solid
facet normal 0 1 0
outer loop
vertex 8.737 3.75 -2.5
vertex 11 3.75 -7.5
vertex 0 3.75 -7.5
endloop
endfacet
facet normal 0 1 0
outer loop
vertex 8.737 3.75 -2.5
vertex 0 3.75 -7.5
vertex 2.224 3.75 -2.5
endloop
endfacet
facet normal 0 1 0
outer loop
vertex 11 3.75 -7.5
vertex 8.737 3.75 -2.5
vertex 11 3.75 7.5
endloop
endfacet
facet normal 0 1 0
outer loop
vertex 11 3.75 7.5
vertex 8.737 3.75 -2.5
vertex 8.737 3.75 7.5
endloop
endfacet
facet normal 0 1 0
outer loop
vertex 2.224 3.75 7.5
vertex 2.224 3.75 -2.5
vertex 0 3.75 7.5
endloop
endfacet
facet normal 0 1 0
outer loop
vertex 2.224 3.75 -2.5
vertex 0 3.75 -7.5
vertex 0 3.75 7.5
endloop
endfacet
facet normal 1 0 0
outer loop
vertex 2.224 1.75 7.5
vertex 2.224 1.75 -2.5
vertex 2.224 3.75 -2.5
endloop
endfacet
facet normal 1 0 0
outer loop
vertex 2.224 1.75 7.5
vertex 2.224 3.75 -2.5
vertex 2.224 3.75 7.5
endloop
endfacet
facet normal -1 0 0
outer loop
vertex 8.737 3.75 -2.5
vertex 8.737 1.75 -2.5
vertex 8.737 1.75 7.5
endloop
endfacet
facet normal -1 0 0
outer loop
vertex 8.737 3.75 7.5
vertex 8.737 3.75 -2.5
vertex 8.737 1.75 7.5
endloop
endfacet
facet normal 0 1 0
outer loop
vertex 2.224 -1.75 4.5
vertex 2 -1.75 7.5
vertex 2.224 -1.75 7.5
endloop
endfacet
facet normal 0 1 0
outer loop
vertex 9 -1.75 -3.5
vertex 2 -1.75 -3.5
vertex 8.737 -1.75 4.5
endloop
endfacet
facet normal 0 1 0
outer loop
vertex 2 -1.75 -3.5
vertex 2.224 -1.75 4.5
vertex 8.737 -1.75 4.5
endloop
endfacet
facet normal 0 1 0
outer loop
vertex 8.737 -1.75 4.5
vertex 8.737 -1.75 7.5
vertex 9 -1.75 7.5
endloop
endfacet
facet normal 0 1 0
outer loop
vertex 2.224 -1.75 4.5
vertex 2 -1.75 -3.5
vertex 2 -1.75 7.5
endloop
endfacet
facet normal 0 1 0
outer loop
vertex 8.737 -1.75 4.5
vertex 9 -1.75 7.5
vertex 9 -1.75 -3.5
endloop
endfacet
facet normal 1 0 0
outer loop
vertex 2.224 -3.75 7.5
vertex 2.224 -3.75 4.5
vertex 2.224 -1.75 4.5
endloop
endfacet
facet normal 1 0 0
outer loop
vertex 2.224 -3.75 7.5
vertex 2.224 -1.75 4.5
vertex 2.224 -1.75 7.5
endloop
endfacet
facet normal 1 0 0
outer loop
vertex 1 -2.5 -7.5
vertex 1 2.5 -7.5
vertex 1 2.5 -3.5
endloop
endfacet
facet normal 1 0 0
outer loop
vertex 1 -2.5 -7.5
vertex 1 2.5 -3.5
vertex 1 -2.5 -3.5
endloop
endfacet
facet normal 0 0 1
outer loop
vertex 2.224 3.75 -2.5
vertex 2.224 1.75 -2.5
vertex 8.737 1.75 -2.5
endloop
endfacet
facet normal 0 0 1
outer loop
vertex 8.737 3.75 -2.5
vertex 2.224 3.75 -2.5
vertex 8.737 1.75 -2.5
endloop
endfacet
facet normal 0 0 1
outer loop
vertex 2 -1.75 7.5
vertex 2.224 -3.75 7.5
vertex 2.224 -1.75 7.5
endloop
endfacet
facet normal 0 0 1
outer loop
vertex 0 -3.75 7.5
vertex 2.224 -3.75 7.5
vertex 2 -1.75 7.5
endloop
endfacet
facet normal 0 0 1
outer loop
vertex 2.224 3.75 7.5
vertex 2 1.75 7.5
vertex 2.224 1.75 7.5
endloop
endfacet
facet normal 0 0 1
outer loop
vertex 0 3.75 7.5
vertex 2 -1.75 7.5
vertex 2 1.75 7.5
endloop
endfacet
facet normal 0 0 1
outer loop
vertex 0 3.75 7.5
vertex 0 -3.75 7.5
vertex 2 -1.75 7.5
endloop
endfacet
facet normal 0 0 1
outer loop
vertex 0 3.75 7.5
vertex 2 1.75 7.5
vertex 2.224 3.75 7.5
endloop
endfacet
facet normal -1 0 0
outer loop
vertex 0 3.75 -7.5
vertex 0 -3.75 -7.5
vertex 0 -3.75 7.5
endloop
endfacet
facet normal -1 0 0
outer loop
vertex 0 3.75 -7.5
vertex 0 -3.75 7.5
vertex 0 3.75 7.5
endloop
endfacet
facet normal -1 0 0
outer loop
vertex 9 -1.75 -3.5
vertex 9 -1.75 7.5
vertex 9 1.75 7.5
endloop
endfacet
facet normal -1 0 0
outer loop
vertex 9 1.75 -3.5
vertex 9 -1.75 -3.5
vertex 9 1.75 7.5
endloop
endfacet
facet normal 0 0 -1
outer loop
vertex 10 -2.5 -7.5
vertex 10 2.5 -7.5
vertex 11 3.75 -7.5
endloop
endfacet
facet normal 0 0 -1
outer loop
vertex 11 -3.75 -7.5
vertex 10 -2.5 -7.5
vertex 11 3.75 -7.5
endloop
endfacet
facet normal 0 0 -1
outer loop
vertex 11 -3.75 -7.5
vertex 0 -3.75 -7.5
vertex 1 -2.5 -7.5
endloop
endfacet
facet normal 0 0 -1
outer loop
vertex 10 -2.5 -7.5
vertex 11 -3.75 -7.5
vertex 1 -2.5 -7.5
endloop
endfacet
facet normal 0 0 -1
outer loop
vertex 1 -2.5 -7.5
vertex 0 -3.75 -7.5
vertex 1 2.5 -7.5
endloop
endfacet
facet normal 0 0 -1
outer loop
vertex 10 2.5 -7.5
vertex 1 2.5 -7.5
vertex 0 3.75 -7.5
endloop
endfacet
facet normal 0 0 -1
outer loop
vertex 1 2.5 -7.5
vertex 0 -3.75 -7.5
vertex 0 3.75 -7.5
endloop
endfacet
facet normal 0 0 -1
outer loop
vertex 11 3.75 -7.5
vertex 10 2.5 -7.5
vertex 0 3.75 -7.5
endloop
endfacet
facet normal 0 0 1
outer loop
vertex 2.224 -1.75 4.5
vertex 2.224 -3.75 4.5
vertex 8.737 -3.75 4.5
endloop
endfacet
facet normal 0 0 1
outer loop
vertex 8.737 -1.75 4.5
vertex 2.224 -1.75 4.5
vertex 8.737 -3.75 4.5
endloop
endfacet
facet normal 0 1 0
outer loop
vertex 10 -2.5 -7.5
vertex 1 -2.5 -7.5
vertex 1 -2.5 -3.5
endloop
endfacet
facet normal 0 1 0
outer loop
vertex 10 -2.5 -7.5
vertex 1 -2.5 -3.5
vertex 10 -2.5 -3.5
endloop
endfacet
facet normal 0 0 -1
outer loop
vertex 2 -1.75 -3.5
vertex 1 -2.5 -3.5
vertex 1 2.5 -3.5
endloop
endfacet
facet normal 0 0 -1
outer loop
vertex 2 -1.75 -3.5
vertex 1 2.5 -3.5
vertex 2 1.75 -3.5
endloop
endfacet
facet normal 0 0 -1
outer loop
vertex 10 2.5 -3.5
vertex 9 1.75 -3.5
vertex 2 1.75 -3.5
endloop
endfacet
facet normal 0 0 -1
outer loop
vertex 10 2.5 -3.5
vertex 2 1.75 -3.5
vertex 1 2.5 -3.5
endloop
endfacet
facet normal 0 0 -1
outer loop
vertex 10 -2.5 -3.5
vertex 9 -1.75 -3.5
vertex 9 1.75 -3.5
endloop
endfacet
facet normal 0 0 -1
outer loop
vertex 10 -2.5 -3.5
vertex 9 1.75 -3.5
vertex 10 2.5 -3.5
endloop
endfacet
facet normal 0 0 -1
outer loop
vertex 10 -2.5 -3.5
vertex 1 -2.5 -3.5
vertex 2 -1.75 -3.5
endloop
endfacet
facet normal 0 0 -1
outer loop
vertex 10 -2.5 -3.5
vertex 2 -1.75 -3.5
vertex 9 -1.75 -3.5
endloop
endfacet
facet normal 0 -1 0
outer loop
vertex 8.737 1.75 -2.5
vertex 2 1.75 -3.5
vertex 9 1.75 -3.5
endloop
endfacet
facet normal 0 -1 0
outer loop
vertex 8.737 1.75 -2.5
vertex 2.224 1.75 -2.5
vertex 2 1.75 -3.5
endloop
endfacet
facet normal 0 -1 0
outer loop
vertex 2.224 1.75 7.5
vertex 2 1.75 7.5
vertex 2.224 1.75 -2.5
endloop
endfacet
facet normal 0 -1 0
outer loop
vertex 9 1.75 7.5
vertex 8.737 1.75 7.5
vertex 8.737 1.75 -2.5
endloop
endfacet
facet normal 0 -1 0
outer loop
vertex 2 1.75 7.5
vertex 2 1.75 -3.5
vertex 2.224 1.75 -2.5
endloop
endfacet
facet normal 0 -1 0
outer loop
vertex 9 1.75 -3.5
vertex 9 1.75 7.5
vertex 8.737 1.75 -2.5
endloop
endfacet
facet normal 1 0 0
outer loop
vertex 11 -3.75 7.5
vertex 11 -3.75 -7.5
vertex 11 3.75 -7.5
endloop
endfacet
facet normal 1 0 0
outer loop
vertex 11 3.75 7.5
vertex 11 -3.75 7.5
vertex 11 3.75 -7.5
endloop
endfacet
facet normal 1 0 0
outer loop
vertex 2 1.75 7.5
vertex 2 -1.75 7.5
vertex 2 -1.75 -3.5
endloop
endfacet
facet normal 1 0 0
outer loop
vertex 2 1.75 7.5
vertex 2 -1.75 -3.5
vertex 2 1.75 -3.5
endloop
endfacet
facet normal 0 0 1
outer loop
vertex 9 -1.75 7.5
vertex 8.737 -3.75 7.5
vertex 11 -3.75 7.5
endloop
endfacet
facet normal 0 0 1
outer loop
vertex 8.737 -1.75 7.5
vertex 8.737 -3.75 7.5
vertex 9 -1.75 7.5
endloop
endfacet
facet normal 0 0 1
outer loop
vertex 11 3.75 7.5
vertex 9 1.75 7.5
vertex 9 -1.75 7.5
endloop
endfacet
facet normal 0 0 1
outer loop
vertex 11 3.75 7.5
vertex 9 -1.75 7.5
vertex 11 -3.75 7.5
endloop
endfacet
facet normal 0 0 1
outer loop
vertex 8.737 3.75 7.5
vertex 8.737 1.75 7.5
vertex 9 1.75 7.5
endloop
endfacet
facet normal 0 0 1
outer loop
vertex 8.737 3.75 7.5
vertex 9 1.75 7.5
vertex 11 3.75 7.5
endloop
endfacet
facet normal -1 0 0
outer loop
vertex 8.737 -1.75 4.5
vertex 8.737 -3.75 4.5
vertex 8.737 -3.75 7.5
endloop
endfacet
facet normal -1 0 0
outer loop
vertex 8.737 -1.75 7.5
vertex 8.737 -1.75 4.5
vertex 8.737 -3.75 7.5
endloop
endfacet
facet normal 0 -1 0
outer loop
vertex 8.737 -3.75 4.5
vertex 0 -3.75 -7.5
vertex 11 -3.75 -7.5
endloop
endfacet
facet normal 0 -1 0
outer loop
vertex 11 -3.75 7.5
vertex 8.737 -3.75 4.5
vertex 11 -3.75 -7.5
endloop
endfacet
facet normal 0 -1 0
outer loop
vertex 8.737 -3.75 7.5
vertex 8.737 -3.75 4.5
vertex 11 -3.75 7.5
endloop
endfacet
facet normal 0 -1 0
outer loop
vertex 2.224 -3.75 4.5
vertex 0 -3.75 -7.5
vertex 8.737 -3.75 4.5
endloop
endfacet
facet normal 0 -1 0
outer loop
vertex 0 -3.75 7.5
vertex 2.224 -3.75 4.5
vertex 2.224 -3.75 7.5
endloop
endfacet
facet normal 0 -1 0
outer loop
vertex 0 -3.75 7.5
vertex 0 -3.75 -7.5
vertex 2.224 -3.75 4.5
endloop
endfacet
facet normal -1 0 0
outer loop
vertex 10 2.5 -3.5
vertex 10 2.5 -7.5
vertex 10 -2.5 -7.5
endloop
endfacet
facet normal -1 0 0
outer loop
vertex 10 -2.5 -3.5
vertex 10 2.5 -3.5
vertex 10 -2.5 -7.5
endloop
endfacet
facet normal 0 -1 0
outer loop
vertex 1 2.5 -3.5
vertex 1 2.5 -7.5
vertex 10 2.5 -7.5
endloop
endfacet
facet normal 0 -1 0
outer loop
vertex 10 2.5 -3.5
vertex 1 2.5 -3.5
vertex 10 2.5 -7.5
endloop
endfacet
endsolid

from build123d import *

# Parameters (mm, degrees)
F0_W     = 7.5
F0_H     = 15
F1_DEPTH = 11
F2_W     = 7
F2_H     = 3.5
F3_DEPTH = 20
F4_W     = 9
F4_H     = 5
F5_DEPTH = 4
F6_W     = 6.512857
F6_H     = 3
F7_DEPTH = 25
F8_W     = 6.512857
F8_H     = 7
F9_DEPTH = 25


with BuildPart() as f1:
    # F0 (on Right) → F1 (new body)
    with BuildSketch(Plane.YZ):
        Rectangle(F0_W, F0_H)
    extrude(amount=F1_DEPTH)

    # F2 (on face) → F3 (cut)
    with BuildSketch(Plane.XY.offset(7.5)):
        with Locations((5.5, 0)):
            Rectangle(F2_W, F2_H)
    extrude(amount=-F3_DEPTH, mode=Mode.SUBTRACT)

    # F4 (on face) → F5 (cut)
    with BuildSketch(Plane(origin=(0, 0, -7.5), x_dir=(1, 0, 0), z_dir=(0, 0, -1))):
        with Locations((5.5, 0)):
            Rectangle(F4_W, F4_H)
    extrude(amount=-F5_DEPTH, mode=Mode.SUBTRACT)

    # F6 (on face) → F7 (cut)
    with BuildSketch(Plane.XZ.offset(3.75)):
        with Locations((5.480695, 6)):
            Rectangle(F6_W, F6_H)
    extrude(amount=-F7_DEPTH, mode=Mode.SUBTRACT)

    # F8 (on Front) → F9 (cut)
    with BuildSketch(Plane.XZ):
        with Locations((5.480695, 1)):
            Rectangle(F8_W, F8_H)
    extrude(amount=-F9_DEPTH, mode=Mode.SUBTRACT)


solid = f1.part
